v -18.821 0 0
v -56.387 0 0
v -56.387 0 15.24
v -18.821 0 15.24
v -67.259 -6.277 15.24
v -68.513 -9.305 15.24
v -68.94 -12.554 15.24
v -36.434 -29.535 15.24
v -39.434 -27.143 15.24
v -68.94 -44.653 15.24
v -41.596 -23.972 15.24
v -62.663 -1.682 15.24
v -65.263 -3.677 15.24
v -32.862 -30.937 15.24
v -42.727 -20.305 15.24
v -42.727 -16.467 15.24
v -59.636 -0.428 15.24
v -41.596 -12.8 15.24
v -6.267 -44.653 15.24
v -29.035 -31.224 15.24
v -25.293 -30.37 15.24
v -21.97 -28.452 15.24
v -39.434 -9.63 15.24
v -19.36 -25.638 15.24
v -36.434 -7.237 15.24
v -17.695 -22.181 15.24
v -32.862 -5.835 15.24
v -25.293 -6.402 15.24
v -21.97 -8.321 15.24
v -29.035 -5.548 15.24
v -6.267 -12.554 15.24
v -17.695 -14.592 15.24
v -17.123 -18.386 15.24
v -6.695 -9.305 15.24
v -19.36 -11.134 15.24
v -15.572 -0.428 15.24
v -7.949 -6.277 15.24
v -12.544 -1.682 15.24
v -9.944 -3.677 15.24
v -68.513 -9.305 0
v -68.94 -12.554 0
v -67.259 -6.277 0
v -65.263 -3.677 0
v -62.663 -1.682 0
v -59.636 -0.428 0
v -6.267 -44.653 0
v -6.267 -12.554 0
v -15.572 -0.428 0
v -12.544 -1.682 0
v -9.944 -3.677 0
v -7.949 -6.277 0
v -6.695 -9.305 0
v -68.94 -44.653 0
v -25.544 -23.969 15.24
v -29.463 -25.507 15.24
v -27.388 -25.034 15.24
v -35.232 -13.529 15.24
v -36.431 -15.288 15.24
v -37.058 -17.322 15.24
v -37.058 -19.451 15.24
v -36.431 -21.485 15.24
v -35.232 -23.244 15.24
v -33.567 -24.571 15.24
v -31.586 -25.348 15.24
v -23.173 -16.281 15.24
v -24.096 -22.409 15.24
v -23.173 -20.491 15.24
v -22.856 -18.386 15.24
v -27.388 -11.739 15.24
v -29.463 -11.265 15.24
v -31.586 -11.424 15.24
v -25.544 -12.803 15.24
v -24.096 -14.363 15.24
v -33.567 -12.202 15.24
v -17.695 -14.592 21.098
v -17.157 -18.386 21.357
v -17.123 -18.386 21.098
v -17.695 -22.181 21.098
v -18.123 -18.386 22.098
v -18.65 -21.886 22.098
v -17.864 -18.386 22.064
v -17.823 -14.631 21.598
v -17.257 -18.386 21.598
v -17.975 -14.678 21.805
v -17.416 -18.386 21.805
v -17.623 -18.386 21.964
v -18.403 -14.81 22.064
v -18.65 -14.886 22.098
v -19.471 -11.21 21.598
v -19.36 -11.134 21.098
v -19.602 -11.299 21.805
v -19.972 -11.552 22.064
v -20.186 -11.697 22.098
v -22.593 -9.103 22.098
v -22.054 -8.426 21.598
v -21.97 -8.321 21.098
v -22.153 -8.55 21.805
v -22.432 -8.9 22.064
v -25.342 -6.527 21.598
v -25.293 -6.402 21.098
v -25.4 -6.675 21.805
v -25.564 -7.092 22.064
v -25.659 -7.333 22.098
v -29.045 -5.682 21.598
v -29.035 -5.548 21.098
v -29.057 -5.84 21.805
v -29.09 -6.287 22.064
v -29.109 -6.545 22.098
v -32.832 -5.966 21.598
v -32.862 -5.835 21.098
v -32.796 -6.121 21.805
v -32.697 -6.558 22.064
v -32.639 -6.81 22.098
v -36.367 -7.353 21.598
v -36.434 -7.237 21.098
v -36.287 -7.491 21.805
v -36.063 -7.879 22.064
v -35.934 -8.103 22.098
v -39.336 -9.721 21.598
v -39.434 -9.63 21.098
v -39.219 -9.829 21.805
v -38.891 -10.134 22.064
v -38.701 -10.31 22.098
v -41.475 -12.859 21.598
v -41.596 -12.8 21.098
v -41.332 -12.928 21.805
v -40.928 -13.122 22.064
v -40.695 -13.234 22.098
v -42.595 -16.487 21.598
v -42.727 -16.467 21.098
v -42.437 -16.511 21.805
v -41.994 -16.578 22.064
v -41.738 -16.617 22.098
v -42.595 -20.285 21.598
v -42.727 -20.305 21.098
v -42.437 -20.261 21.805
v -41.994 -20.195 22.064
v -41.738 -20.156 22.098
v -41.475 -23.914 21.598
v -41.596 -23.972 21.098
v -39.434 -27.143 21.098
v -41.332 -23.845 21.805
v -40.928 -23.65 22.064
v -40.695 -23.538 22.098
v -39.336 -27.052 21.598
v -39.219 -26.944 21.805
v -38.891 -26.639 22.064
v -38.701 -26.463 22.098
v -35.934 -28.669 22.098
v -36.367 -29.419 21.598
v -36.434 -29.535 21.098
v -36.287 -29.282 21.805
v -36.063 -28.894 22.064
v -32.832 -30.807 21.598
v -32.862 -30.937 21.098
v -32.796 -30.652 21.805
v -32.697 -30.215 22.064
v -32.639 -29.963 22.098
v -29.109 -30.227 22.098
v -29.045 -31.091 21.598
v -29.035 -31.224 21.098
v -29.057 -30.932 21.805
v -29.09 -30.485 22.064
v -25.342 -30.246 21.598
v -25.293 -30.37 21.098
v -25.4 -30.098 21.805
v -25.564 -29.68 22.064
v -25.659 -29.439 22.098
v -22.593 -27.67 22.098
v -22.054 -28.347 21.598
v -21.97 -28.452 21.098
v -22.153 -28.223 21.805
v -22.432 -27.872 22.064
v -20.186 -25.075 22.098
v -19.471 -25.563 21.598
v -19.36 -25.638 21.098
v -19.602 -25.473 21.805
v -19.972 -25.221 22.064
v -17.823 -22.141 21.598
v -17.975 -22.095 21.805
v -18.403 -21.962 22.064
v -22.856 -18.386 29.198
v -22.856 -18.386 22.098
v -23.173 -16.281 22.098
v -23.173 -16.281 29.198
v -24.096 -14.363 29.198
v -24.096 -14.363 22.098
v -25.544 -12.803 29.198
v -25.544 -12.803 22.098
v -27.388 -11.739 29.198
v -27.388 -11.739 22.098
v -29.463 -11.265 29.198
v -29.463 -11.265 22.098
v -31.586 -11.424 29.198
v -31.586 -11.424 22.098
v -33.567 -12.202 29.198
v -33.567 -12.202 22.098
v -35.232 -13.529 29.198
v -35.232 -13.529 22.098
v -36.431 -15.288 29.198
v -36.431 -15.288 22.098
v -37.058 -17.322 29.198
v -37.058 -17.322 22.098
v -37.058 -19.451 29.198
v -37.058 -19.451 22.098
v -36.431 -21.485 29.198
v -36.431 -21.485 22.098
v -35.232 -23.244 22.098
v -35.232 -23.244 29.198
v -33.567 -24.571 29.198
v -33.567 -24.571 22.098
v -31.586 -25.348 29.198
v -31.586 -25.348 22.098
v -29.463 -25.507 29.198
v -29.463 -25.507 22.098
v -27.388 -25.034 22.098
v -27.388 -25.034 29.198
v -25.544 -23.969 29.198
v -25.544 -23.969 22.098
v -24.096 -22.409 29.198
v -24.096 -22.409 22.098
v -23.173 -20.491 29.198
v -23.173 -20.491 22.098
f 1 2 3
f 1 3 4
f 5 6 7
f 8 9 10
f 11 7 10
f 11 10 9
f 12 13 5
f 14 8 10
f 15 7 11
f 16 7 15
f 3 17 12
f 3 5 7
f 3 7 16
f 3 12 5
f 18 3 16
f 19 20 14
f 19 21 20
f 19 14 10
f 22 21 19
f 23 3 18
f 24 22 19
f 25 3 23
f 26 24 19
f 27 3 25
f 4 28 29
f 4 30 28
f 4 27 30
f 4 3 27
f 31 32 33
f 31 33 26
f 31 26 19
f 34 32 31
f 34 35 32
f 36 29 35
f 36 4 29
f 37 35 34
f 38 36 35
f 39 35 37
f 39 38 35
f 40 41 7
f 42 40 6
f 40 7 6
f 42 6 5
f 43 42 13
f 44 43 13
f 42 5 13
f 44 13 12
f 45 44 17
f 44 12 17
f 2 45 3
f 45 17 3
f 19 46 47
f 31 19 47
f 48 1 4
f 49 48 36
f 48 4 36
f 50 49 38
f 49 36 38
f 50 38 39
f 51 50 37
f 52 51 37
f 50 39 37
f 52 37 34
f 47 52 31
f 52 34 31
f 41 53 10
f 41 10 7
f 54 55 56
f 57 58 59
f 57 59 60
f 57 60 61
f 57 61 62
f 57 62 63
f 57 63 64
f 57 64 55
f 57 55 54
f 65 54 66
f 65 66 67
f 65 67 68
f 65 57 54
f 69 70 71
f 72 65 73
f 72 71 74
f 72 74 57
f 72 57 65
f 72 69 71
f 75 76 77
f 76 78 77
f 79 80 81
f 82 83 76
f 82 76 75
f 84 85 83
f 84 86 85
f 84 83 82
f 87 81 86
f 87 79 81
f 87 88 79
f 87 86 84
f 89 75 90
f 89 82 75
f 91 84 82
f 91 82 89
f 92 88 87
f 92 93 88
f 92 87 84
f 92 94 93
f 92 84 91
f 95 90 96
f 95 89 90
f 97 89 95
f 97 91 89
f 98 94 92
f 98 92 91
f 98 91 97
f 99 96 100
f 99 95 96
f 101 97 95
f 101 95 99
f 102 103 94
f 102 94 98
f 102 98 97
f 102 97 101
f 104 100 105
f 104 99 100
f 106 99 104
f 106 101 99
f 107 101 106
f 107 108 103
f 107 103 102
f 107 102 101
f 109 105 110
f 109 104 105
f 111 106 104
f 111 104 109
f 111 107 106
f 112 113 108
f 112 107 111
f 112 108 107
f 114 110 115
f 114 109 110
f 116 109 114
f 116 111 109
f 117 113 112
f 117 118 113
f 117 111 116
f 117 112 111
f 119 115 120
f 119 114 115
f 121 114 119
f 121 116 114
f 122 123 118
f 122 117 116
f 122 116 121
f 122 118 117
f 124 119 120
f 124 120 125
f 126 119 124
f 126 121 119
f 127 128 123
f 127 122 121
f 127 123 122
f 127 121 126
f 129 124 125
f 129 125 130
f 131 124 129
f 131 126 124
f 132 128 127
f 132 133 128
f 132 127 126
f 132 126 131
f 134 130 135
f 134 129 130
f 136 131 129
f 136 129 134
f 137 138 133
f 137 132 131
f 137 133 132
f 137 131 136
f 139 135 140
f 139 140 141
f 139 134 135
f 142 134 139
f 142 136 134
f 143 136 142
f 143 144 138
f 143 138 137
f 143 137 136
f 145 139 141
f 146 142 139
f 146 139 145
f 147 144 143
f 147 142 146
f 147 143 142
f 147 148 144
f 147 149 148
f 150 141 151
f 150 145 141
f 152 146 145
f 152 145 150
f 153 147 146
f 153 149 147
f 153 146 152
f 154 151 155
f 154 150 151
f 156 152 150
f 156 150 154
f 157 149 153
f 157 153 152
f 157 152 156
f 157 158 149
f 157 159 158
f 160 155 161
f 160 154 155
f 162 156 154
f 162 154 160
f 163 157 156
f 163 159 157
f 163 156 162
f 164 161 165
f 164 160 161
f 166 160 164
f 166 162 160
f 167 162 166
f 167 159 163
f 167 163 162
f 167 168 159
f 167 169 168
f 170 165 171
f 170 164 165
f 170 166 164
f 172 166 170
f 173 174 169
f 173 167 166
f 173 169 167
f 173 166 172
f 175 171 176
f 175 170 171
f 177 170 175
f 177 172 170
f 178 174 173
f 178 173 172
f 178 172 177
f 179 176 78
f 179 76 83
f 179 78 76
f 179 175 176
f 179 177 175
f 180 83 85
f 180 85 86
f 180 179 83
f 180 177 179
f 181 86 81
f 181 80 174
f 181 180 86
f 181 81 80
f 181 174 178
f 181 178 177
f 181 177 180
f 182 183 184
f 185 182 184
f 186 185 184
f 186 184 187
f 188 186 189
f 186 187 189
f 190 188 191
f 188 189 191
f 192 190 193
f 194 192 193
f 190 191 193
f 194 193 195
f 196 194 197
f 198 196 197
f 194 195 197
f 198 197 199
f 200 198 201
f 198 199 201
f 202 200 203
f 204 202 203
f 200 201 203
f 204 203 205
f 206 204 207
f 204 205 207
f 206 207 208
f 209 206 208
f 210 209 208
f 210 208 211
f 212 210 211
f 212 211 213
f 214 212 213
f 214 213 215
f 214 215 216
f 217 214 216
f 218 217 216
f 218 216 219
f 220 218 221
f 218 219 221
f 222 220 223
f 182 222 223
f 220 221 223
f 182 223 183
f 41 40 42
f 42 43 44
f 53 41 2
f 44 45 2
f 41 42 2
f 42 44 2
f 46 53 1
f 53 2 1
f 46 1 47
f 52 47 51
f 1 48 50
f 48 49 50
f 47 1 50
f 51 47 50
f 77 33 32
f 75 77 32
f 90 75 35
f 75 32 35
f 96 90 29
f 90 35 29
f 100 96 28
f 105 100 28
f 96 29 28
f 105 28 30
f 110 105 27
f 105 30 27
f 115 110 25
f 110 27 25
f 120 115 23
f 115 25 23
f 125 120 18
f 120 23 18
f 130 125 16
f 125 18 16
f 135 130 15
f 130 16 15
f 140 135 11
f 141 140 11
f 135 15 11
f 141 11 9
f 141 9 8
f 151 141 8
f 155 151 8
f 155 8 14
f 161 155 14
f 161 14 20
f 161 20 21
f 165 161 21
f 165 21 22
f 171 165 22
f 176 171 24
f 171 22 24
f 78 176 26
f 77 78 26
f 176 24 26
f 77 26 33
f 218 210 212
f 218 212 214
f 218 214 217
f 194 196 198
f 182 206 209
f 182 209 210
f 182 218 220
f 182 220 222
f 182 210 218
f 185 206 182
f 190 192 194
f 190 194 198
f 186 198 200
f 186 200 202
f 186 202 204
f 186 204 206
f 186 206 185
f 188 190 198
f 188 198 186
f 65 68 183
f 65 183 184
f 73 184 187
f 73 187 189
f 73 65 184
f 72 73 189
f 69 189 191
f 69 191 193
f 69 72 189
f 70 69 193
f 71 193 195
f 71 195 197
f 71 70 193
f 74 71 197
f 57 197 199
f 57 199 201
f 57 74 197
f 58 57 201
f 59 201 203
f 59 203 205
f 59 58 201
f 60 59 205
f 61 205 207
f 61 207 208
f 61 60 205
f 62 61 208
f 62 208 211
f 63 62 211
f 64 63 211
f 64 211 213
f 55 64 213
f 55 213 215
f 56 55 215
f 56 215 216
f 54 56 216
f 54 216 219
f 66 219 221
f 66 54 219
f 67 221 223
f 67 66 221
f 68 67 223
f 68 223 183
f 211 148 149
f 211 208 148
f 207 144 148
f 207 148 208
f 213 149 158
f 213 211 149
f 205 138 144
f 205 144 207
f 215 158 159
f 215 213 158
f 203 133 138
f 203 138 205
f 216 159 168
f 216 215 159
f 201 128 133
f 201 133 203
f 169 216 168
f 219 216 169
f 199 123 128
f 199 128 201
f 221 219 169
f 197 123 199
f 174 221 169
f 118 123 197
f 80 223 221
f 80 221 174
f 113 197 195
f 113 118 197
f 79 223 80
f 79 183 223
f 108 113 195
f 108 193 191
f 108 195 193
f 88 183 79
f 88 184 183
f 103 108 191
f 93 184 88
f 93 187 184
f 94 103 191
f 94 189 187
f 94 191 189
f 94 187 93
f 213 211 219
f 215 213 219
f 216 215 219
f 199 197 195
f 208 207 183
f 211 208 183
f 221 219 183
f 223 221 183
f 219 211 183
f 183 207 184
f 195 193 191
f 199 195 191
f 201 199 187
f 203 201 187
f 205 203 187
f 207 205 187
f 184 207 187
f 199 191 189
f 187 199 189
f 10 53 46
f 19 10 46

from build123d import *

# Parameters (mm, degrees)
F0_W     = 62.673188746
F0_H     = 44.6528419852
F2_DEPTH = 15.24
F5_R     = 12.8740091113
F5_R_2   = 7.1412124382
F6_DEPTH = 6.858
F7_R     = 1
F8_R     = 7.1412124382
F9_DEPTH = 7.1
F10_R    = 12.5539105243


with BuildPart() as f2:
    # F0 (on Top) → F2 (new body)
    with BuildSketch(Plane.XY):
        with Locations((-37.603829056, -22.3264209926)):
            Rectangle(F0_W, F0_H)
    extrude(amount=F2_DEPTH)

    # F5 (on face) → F6 (join)
    with BuildSketch(Plane.XY.offset(15.24)):
        with Locations((-29.9968216568, -18.3862540871)):
            Circle(F5_R)
        with Locations((-29.9968216568, -18.3862540871)):
            Circle(F5_R_2, mode=Mode.SUBTRACT)
    extrude(amount=F6_DEPTH)

    # F7
    f7_edges = [f2.edges().sort_by_distance(p)[0] for p in [
        (-42.870831, -18.386254, 22.098),
    ]]
    fillet(f7_edges, radius=F7_R)

    # F10
    f10_edges = [f2.edges().sort_by_distance(p)[0] for p in [
        (-68.940423, 0, 7.62),
        (-6.267235, 0, 7.62),
    ]]
    fillet(f10_edges, radius=F10_R)


with BuildPart() as f9:
    # F8 (on face) → F9 (new body)
    with BuildSketch(Plane.XY.offset(22.098)):
        with Locations((-29.9968216568, -18.3862540871)):
            Circle(F8_R)
    extrude(amount=F9_DEPTH)


solid = Compound([f2.part, f9.part])
